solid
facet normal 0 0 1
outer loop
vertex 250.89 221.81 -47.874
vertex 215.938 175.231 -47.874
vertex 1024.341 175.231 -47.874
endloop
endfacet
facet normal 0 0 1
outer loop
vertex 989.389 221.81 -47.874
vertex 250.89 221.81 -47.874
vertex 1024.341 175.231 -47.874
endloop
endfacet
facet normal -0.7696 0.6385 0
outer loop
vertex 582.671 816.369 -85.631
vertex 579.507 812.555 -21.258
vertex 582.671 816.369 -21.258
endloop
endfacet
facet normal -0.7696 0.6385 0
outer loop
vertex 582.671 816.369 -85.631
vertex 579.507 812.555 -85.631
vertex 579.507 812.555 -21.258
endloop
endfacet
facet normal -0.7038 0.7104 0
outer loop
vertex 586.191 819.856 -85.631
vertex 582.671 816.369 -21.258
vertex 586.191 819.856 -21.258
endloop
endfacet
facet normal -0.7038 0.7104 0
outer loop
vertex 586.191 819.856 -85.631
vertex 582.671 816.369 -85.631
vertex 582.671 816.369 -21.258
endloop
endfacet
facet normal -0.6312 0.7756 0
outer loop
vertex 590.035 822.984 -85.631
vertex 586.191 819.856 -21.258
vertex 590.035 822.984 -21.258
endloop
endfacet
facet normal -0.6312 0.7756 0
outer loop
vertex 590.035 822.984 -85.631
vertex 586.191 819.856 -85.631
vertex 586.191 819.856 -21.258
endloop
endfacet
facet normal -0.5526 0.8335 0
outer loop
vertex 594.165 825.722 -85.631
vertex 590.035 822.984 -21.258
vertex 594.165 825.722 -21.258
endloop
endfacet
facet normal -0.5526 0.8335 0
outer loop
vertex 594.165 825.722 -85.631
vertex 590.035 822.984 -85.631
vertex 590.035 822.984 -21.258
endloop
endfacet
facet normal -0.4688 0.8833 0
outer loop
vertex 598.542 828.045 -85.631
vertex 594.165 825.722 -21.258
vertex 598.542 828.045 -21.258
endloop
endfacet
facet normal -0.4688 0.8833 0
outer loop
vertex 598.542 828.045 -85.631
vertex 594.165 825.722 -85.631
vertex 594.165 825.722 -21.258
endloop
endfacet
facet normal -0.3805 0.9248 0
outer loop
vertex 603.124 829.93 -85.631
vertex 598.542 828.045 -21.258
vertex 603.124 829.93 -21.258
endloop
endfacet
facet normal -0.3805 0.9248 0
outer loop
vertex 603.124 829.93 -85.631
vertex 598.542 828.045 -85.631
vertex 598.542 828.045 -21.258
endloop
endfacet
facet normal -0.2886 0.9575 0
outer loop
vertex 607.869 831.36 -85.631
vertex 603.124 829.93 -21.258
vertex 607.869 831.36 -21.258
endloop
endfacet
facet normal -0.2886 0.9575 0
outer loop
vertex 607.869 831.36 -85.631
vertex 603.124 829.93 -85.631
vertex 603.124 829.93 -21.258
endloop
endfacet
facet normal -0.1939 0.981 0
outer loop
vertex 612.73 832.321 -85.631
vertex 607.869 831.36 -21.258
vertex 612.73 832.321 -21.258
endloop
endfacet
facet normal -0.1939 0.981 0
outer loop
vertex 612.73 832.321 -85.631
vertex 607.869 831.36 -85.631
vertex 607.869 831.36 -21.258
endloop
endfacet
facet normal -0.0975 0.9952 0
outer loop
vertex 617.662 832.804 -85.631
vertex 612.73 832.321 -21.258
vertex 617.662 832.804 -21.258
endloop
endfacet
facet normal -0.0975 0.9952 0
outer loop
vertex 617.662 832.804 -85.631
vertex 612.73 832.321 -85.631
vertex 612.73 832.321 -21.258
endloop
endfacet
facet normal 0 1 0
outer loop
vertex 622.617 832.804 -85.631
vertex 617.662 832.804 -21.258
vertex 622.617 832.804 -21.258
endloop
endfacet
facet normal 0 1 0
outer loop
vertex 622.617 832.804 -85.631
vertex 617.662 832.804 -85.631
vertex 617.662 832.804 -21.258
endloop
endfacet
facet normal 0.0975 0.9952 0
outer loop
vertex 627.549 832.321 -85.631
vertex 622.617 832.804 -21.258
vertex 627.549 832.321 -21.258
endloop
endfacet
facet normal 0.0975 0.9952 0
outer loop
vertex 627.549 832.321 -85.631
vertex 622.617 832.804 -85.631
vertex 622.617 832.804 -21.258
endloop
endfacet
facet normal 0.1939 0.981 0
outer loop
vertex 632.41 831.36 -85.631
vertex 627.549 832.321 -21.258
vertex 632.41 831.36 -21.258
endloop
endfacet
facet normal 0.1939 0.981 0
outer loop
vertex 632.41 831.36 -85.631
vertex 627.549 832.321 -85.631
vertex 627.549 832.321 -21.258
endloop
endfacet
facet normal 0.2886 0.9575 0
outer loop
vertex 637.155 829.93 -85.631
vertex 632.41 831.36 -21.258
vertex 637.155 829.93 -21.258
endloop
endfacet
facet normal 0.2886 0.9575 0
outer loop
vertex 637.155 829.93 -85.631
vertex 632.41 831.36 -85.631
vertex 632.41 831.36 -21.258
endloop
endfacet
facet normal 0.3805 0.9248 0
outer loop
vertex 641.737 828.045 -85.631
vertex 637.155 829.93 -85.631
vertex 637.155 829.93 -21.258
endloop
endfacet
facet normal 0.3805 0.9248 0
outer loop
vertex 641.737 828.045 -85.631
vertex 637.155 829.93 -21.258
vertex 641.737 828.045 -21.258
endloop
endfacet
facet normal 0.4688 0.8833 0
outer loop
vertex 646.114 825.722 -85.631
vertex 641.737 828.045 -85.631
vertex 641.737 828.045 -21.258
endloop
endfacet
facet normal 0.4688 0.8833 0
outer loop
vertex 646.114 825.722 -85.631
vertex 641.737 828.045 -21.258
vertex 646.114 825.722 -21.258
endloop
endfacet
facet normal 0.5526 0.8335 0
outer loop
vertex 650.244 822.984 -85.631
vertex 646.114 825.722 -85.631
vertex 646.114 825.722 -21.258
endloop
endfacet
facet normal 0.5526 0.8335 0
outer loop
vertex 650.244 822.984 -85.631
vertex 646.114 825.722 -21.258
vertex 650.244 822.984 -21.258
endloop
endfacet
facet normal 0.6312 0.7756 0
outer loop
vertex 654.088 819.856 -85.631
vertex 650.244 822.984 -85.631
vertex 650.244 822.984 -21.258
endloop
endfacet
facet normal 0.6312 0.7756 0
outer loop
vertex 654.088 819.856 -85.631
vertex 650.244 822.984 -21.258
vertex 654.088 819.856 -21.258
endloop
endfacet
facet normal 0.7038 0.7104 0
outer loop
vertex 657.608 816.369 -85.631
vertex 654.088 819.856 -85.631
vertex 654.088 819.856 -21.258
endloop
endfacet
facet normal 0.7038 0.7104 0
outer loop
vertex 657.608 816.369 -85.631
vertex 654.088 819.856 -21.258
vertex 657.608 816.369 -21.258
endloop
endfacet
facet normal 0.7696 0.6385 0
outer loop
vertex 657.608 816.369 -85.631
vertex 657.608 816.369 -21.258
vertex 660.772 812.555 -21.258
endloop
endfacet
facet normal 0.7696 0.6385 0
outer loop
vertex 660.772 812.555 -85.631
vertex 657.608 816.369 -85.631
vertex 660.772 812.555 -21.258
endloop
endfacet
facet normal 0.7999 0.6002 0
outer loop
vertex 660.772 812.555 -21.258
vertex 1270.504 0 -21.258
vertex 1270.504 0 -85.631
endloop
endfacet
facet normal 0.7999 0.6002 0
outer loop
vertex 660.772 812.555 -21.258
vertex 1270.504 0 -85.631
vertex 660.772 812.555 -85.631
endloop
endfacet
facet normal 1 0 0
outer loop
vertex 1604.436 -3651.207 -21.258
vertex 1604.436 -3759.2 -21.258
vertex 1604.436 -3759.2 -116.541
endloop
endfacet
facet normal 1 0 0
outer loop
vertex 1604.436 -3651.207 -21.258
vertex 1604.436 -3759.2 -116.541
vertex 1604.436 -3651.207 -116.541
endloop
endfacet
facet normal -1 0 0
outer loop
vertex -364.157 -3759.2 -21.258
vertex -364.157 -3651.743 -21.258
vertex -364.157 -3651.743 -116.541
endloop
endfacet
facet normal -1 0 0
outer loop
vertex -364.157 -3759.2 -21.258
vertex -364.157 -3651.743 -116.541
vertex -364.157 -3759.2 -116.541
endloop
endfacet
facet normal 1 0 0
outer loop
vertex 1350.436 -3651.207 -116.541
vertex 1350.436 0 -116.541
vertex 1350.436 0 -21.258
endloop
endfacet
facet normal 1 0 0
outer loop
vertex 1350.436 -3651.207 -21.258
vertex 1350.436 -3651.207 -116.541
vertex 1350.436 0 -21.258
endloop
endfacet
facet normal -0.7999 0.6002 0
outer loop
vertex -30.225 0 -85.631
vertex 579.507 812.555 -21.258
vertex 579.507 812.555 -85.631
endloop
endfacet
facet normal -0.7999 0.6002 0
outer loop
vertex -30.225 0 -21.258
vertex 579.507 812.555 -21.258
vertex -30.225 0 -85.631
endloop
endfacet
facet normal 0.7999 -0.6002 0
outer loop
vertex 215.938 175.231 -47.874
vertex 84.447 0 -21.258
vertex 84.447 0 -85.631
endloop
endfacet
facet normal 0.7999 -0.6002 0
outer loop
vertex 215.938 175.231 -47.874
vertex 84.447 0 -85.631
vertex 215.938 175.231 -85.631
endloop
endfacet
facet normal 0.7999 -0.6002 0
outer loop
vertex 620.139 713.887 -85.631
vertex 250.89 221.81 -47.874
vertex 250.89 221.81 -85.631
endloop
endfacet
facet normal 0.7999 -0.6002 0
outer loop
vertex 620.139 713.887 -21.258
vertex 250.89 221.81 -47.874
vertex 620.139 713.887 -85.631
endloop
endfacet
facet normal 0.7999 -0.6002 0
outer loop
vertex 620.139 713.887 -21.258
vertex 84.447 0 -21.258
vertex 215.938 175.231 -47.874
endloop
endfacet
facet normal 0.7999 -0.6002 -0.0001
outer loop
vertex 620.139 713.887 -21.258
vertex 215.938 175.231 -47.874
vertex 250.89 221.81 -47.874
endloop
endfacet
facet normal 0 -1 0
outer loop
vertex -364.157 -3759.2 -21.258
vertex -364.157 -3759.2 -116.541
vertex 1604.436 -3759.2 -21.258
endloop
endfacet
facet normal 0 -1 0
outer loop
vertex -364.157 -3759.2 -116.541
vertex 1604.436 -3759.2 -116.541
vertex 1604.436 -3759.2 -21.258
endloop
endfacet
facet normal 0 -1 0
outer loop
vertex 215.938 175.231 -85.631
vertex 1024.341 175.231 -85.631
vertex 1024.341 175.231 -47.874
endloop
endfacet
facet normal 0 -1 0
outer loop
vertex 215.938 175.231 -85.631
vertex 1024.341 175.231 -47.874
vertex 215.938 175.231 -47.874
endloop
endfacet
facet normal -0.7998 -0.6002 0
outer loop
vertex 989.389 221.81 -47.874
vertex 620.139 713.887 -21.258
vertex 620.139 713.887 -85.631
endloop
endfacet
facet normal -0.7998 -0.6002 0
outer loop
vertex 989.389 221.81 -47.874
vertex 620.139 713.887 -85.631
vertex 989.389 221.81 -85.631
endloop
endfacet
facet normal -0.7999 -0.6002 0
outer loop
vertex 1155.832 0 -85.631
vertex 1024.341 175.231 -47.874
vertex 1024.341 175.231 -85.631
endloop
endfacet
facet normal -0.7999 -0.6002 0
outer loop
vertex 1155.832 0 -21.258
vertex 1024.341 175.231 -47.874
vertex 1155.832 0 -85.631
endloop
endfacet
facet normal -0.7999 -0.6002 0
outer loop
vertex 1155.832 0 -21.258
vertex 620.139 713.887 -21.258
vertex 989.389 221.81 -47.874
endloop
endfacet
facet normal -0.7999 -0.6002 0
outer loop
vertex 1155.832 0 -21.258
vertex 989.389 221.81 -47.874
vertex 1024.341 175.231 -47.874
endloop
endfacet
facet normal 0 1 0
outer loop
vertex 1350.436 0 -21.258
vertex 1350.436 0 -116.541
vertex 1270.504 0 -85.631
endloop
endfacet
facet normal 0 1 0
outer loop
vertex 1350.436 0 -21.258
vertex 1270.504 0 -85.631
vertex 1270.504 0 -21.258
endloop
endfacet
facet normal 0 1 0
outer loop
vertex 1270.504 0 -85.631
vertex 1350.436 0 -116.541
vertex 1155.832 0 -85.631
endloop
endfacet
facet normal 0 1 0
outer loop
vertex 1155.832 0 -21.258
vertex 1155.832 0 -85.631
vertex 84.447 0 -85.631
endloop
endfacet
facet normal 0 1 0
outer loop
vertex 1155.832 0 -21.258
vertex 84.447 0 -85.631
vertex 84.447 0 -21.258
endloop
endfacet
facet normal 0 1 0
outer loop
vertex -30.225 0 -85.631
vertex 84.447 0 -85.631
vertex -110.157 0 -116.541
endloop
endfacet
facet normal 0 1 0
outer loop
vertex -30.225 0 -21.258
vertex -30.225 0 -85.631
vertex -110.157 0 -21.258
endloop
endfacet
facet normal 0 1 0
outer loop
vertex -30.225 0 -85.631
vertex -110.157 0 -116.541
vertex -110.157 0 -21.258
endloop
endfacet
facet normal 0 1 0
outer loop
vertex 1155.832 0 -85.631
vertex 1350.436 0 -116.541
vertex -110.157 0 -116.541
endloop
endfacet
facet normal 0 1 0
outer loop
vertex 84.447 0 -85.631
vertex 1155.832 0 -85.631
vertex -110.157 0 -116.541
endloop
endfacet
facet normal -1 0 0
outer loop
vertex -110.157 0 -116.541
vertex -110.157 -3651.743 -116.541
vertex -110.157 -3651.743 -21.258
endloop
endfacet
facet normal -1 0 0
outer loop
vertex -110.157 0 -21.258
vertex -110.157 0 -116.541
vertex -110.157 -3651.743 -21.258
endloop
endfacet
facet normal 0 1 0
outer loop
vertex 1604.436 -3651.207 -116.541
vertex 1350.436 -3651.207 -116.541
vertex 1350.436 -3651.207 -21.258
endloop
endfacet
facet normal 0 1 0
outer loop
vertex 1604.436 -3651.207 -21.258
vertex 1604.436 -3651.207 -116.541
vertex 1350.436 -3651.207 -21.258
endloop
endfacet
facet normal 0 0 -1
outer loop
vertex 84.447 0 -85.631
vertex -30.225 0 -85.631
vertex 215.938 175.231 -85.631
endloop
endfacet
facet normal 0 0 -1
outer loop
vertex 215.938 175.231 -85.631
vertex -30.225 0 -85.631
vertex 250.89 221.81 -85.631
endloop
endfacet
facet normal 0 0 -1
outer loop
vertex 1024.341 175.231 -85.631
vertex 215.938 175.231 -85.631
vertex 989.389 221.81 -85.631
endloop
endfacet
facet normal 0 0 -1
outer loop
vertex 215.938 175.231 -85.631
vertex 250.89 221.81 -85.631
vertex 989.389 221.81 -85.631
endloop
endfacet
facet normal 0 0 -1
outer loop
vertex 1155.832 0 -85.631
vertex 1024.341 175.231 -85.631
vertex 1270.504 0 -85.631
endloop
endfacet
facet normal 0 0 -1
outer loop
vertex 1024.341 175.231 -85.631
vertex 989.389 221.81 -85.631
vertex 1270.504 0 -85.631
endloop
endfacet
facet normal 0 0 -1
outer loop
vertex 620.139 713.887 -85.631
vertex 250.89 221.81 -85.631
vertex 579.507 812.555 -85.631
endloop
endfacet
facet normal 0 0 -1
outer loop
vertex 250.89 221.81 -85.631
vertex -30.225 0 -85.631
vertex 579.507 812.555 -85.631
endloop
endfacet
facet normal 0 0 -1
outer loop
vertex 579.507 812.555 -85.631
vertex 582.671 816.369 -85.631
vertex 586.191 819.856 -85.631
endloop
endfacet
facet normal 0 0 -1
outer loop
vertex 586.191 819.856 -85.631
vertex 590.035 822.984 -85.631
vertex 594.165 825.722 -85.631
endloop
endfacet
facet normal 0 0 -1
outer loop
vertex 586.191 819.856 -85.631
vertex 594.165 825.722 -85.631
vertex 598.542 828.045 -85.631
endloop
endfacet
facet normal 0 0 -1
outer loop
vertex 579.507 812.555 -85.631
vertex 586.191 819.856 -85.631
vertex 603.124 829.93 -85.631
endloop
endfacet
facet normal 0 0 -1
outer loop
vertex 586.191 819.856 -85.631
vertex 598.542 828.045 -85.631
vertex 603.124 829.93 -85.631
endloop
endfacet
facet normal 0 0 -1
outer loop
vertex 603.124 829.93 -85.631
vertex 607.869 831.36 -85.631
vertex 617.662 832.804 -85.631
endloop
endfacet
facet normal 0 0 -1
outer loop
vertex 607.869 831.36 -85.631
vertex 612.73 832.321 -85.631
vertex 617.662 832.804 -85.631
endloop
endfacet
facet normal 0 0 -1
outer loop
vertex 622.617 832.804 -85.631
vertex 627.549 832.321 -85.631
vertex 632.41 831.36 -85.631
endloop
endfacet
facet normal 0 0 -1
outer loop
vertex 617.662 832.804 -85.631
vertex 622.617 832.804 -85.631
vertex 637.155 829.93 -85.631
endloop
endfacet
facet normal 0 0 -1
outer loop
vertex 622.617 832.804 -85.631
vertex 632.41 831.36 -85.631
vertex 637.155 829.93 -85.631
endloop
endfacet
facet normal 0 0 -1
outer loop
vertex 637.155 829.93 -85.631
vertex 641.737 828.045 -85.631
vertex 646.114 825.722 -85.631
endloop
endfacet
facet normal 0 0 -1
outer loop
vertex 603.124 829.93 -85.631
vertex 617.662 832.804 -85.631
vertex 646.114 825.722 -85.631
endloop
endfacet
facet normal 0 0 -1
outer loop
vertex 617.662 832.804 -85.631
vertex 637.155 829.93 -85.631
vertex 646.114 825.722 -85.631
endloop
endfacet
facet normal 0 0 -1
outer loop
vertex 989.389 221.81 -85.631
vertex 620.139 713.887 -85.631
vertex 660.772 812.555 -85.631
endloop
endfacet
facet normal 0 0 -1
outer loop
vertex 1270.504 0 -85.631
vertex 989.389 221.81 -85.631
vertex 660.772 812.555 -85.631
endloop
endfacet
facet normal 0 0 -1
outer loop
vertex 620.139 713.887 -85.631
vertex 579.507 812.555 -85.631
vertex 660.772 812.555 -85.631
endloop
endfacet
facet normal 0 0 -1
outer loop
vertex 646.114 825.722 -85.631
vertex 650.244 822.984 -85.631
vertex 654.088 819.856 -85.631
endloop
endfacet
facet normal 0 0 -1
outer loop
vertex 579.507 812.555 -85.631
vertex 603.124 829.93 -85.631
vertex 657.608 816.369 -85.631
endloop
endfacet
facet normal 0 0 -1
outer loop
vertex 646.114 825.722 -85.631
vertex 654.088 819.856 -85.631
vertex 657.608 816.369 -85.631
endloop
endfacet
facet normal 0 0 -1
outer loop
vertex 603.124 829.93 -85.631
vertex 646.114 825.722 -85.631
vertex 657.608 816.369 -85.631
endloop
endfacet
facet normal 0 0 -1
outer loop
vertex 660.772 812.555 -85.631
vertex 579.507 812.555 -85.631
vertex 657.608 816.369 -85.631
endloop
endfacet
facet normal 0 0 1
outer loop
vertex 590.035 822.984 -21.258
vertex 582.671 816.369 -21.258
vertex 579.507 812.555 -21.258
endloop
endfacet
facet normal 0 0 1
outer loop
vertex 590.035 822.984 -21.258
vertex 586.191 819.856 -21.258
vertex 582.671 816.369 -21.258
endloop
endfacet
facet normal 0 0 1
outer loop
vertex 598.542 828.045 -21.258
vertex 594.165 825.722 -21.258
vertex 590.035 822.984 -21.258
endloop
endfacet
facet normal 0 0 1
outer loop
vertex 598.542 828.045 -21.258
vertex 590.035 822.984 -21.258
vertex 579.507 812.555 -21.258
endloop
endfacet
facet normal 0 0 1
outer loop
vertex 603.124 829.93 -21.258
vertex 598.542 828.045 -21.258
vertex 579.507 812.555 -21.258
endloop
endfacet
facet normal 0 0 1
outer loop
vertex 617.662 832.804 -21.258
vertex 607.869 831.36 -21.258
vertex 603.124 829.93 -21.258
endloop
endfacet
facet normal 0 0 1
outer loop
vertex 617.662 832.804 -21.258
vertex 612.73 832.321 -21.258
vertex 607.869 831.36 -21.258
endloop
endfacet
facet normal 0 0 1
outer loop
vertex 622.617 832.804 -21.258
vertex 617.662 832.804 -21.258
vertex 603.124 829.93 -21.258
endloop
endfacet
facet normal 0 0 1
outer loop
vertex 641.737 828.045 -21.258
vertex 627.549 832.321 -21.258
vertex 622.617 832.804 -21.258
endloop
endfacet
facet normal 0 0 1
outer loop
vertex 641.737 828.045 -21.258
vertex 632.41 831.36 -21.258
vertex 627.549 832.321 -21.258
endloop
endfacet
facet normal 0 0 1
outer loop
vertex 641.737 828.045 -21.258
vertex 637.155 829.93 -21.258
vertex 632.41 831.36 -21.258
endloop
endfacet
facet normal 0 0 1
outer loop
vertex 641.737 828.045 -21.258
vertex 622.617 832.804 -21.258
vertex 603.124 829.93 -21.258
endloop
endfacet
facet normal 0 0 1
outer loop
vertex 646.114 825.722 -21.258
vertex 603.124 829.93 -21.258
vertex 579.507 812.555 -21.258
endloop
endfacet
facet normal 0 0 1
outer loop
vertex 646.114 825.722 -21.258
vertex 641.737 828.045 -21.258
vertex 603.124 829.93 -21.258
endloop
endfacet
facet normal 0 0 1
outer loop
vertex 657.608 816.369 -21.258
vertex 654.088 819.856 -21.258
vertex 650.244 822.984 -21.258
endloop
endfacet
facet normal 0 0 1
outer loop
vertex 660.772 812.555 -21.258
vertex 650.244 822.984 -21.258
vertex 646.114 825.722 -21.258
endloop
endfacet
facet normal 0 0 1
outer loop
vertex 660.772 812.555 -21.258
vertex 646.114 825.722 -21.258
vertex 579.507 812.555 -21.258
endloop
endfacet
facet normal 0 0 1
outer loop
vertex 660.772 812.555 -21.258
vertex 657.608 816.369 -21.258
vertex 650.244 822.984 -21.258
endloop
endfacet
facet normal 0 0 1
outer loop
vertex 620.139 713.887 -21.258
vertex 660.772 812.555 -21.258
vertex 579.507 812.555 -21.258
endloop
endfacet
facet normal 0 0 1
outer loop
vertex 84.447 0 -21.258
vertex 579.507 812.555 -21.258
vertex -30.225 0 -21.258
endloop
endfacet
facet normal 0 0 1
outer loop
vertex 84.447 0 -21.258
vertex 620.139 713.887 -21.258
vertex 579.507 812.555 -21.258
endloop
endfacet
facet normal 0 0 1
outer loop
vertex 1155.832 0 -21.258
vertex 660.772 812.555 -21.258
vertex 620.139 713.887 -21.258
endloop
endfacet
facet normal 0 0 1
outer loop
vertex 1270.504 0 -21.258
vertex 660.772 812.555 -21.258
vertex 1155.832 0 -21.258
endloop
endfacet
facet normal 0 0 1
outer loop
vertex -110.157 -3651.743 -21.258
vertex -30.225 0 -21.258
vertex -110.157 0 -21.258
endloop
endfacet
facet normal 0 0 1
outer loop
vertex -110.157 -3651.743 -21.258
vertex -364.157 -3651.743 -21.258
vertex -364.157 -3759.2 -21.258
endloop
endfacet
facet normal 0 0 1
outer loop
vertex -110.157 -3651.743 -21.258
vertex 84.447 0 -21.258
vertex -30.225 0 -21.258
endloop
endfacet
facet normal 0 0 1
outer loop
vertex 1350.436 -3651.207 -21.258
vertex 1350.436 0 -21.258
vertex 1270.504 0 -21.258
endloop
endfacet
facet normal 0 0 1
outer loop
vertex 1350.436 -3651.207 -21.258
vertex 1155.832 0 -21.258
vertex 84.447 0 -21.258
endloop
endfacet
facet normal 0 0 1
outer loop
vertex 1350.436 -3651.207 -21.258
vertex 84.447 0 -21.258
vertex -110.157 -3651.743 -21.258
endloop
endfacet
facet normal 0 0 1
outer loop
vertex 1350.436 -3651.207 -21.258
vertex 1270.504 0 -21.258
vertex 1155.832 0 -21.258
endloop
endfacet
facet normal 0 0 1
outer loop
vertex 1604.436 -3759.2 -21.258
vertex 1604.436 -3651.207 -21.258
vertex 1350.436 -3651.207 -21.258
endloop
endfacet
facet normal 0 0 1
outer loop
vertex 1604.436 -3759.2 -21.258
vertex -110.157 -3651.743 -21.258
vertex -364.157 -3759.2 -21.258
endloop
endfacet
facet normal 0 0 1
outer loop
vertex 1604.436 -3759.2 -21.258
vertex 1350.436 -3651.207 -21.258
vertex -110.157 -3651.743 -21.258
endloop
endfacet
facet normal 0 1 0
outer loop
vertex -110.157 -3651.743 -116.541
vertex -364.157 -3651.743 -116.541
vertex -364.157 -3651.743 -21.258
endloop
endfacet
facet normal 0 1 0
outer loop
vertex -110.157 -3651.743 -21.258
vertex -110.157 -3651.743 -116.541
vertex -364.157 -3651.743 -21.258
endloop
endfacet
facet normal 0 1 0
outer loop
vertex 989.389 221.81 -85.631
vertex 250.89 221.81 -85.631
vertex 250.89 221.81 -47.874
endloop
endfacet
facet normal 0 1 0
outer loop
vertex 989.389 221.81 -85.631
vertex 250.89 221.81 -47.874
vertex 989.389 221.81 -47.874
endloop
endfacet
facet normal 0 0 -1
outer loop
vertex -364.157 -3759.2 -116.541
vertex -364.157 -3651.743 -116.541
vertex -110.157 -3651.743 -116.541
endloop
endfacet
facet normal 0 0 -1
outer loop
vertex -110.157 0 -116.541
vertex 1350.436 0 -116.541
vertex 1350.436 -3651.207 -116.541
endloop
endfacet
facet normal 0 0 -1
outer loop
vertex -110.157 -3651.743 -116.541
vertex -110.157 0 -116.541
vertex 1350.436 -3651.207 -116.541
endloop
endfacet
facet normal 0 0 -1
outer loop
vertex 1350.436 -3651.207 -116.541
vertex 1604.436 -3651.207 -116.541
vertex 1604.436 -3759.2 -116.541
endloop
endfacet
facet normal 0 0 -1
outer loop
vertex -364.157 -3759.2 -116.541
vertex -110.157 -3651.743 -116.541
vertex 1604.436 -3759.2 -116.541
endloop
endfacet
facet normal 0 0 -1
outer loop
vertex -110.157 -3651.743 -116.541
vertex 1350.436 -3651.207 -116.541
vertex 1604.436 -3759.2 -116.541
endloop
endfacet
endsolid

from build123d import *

# Parameters (mm, degrees)
F0_W      = 1435.1926669478
F0_H      = 95.2825993299
F1_DEPTH  = 3759.2
F2_DEPTH  = 25.4
F3_W      = 107.992552948
F3_H      = 95.2825993299
F4_DEPTH  = 254
F5_W      = 107.4568264008
F5_H      = 95.2825993299
F6_DEPTH  = 254
F8_DEPTH  = 64.3732398748
F9_R      = 50.8
F11_DEPTH = 37.7572048455


with BuildPart() as f1:
    # F0 (on Front) → F1 (new body)
    with BuildSketch(Plane.XZ):
        with Locations((607.4394695461, -68.8994899392)):
            Rectangle(F0_W, F0_H)
    extrude(amount=F1_DEPTH)

    # F2 (add): a face of the model
    f2_faces = [f1.faces().sort_by_distance(p)[0] for p in [
        (1325.03580302, -1879.6, -68.8994899392),
    ]]
    extrude(f2_faces, amount=F2_DEPTH)

    # F3 (on face) → F4 (join)
    with BuildSketch(Plane.YZ.offset(1350.43580302)):
        with Locations((-3705.203723526, -68.8994899392)):
            Rectangle(F3_W, F3_H)
    extrude(amount=F4_DEPTH)

    # F5 (on face) → F6 (join)
    with BuildSketch(Plane(origin=(-110.1568639278, 0, 0), x_dir=(0, -1, 0), z_dir=(-1, 0, 0))):
        with Locations((3705.4715867996, -68.8994899392)):
            Rectangle(F5_W, F5_H)
    extrude(amount=F6_DEPTH)

    # F7 (on face) → F8 (join)
    with BuildSketch(Plane.XY.offset(-21.2581902742)):
        Polygon((1155.8323002696, 0), (1270.5040539747, 0), (620.1394695461, 866.7032718658), (-30.2251148825, 0), (84.4466388226, 0), (620.1394695461, 713.8868570328), align=None)
    extrude(amount=-F8_DEPTH)

    # F9
    f9_edges = [f1.edges().sort_by_distance(p)[0] for p in [
        (620.13947, 866.703272, -53.44481),
    ]]
    fillet(f9_edges, radius=F9_R)

    # F10 (on face) → F11 (join)
    with BuildSketch(Plane(origin=(0, 0, -85.6314301491), x_dir=(1, 0, 0), z_dir=(0, 0, -1))):
        Polygon((1024.341010293, -175.2308381685), (215.9379287991, -175.2308381685), (250.8901155181, -221.809596166), (989.388823574, -221.809596166), align=None)
    extrude(amount=-F11_DEPTH)


solid = f1.part
